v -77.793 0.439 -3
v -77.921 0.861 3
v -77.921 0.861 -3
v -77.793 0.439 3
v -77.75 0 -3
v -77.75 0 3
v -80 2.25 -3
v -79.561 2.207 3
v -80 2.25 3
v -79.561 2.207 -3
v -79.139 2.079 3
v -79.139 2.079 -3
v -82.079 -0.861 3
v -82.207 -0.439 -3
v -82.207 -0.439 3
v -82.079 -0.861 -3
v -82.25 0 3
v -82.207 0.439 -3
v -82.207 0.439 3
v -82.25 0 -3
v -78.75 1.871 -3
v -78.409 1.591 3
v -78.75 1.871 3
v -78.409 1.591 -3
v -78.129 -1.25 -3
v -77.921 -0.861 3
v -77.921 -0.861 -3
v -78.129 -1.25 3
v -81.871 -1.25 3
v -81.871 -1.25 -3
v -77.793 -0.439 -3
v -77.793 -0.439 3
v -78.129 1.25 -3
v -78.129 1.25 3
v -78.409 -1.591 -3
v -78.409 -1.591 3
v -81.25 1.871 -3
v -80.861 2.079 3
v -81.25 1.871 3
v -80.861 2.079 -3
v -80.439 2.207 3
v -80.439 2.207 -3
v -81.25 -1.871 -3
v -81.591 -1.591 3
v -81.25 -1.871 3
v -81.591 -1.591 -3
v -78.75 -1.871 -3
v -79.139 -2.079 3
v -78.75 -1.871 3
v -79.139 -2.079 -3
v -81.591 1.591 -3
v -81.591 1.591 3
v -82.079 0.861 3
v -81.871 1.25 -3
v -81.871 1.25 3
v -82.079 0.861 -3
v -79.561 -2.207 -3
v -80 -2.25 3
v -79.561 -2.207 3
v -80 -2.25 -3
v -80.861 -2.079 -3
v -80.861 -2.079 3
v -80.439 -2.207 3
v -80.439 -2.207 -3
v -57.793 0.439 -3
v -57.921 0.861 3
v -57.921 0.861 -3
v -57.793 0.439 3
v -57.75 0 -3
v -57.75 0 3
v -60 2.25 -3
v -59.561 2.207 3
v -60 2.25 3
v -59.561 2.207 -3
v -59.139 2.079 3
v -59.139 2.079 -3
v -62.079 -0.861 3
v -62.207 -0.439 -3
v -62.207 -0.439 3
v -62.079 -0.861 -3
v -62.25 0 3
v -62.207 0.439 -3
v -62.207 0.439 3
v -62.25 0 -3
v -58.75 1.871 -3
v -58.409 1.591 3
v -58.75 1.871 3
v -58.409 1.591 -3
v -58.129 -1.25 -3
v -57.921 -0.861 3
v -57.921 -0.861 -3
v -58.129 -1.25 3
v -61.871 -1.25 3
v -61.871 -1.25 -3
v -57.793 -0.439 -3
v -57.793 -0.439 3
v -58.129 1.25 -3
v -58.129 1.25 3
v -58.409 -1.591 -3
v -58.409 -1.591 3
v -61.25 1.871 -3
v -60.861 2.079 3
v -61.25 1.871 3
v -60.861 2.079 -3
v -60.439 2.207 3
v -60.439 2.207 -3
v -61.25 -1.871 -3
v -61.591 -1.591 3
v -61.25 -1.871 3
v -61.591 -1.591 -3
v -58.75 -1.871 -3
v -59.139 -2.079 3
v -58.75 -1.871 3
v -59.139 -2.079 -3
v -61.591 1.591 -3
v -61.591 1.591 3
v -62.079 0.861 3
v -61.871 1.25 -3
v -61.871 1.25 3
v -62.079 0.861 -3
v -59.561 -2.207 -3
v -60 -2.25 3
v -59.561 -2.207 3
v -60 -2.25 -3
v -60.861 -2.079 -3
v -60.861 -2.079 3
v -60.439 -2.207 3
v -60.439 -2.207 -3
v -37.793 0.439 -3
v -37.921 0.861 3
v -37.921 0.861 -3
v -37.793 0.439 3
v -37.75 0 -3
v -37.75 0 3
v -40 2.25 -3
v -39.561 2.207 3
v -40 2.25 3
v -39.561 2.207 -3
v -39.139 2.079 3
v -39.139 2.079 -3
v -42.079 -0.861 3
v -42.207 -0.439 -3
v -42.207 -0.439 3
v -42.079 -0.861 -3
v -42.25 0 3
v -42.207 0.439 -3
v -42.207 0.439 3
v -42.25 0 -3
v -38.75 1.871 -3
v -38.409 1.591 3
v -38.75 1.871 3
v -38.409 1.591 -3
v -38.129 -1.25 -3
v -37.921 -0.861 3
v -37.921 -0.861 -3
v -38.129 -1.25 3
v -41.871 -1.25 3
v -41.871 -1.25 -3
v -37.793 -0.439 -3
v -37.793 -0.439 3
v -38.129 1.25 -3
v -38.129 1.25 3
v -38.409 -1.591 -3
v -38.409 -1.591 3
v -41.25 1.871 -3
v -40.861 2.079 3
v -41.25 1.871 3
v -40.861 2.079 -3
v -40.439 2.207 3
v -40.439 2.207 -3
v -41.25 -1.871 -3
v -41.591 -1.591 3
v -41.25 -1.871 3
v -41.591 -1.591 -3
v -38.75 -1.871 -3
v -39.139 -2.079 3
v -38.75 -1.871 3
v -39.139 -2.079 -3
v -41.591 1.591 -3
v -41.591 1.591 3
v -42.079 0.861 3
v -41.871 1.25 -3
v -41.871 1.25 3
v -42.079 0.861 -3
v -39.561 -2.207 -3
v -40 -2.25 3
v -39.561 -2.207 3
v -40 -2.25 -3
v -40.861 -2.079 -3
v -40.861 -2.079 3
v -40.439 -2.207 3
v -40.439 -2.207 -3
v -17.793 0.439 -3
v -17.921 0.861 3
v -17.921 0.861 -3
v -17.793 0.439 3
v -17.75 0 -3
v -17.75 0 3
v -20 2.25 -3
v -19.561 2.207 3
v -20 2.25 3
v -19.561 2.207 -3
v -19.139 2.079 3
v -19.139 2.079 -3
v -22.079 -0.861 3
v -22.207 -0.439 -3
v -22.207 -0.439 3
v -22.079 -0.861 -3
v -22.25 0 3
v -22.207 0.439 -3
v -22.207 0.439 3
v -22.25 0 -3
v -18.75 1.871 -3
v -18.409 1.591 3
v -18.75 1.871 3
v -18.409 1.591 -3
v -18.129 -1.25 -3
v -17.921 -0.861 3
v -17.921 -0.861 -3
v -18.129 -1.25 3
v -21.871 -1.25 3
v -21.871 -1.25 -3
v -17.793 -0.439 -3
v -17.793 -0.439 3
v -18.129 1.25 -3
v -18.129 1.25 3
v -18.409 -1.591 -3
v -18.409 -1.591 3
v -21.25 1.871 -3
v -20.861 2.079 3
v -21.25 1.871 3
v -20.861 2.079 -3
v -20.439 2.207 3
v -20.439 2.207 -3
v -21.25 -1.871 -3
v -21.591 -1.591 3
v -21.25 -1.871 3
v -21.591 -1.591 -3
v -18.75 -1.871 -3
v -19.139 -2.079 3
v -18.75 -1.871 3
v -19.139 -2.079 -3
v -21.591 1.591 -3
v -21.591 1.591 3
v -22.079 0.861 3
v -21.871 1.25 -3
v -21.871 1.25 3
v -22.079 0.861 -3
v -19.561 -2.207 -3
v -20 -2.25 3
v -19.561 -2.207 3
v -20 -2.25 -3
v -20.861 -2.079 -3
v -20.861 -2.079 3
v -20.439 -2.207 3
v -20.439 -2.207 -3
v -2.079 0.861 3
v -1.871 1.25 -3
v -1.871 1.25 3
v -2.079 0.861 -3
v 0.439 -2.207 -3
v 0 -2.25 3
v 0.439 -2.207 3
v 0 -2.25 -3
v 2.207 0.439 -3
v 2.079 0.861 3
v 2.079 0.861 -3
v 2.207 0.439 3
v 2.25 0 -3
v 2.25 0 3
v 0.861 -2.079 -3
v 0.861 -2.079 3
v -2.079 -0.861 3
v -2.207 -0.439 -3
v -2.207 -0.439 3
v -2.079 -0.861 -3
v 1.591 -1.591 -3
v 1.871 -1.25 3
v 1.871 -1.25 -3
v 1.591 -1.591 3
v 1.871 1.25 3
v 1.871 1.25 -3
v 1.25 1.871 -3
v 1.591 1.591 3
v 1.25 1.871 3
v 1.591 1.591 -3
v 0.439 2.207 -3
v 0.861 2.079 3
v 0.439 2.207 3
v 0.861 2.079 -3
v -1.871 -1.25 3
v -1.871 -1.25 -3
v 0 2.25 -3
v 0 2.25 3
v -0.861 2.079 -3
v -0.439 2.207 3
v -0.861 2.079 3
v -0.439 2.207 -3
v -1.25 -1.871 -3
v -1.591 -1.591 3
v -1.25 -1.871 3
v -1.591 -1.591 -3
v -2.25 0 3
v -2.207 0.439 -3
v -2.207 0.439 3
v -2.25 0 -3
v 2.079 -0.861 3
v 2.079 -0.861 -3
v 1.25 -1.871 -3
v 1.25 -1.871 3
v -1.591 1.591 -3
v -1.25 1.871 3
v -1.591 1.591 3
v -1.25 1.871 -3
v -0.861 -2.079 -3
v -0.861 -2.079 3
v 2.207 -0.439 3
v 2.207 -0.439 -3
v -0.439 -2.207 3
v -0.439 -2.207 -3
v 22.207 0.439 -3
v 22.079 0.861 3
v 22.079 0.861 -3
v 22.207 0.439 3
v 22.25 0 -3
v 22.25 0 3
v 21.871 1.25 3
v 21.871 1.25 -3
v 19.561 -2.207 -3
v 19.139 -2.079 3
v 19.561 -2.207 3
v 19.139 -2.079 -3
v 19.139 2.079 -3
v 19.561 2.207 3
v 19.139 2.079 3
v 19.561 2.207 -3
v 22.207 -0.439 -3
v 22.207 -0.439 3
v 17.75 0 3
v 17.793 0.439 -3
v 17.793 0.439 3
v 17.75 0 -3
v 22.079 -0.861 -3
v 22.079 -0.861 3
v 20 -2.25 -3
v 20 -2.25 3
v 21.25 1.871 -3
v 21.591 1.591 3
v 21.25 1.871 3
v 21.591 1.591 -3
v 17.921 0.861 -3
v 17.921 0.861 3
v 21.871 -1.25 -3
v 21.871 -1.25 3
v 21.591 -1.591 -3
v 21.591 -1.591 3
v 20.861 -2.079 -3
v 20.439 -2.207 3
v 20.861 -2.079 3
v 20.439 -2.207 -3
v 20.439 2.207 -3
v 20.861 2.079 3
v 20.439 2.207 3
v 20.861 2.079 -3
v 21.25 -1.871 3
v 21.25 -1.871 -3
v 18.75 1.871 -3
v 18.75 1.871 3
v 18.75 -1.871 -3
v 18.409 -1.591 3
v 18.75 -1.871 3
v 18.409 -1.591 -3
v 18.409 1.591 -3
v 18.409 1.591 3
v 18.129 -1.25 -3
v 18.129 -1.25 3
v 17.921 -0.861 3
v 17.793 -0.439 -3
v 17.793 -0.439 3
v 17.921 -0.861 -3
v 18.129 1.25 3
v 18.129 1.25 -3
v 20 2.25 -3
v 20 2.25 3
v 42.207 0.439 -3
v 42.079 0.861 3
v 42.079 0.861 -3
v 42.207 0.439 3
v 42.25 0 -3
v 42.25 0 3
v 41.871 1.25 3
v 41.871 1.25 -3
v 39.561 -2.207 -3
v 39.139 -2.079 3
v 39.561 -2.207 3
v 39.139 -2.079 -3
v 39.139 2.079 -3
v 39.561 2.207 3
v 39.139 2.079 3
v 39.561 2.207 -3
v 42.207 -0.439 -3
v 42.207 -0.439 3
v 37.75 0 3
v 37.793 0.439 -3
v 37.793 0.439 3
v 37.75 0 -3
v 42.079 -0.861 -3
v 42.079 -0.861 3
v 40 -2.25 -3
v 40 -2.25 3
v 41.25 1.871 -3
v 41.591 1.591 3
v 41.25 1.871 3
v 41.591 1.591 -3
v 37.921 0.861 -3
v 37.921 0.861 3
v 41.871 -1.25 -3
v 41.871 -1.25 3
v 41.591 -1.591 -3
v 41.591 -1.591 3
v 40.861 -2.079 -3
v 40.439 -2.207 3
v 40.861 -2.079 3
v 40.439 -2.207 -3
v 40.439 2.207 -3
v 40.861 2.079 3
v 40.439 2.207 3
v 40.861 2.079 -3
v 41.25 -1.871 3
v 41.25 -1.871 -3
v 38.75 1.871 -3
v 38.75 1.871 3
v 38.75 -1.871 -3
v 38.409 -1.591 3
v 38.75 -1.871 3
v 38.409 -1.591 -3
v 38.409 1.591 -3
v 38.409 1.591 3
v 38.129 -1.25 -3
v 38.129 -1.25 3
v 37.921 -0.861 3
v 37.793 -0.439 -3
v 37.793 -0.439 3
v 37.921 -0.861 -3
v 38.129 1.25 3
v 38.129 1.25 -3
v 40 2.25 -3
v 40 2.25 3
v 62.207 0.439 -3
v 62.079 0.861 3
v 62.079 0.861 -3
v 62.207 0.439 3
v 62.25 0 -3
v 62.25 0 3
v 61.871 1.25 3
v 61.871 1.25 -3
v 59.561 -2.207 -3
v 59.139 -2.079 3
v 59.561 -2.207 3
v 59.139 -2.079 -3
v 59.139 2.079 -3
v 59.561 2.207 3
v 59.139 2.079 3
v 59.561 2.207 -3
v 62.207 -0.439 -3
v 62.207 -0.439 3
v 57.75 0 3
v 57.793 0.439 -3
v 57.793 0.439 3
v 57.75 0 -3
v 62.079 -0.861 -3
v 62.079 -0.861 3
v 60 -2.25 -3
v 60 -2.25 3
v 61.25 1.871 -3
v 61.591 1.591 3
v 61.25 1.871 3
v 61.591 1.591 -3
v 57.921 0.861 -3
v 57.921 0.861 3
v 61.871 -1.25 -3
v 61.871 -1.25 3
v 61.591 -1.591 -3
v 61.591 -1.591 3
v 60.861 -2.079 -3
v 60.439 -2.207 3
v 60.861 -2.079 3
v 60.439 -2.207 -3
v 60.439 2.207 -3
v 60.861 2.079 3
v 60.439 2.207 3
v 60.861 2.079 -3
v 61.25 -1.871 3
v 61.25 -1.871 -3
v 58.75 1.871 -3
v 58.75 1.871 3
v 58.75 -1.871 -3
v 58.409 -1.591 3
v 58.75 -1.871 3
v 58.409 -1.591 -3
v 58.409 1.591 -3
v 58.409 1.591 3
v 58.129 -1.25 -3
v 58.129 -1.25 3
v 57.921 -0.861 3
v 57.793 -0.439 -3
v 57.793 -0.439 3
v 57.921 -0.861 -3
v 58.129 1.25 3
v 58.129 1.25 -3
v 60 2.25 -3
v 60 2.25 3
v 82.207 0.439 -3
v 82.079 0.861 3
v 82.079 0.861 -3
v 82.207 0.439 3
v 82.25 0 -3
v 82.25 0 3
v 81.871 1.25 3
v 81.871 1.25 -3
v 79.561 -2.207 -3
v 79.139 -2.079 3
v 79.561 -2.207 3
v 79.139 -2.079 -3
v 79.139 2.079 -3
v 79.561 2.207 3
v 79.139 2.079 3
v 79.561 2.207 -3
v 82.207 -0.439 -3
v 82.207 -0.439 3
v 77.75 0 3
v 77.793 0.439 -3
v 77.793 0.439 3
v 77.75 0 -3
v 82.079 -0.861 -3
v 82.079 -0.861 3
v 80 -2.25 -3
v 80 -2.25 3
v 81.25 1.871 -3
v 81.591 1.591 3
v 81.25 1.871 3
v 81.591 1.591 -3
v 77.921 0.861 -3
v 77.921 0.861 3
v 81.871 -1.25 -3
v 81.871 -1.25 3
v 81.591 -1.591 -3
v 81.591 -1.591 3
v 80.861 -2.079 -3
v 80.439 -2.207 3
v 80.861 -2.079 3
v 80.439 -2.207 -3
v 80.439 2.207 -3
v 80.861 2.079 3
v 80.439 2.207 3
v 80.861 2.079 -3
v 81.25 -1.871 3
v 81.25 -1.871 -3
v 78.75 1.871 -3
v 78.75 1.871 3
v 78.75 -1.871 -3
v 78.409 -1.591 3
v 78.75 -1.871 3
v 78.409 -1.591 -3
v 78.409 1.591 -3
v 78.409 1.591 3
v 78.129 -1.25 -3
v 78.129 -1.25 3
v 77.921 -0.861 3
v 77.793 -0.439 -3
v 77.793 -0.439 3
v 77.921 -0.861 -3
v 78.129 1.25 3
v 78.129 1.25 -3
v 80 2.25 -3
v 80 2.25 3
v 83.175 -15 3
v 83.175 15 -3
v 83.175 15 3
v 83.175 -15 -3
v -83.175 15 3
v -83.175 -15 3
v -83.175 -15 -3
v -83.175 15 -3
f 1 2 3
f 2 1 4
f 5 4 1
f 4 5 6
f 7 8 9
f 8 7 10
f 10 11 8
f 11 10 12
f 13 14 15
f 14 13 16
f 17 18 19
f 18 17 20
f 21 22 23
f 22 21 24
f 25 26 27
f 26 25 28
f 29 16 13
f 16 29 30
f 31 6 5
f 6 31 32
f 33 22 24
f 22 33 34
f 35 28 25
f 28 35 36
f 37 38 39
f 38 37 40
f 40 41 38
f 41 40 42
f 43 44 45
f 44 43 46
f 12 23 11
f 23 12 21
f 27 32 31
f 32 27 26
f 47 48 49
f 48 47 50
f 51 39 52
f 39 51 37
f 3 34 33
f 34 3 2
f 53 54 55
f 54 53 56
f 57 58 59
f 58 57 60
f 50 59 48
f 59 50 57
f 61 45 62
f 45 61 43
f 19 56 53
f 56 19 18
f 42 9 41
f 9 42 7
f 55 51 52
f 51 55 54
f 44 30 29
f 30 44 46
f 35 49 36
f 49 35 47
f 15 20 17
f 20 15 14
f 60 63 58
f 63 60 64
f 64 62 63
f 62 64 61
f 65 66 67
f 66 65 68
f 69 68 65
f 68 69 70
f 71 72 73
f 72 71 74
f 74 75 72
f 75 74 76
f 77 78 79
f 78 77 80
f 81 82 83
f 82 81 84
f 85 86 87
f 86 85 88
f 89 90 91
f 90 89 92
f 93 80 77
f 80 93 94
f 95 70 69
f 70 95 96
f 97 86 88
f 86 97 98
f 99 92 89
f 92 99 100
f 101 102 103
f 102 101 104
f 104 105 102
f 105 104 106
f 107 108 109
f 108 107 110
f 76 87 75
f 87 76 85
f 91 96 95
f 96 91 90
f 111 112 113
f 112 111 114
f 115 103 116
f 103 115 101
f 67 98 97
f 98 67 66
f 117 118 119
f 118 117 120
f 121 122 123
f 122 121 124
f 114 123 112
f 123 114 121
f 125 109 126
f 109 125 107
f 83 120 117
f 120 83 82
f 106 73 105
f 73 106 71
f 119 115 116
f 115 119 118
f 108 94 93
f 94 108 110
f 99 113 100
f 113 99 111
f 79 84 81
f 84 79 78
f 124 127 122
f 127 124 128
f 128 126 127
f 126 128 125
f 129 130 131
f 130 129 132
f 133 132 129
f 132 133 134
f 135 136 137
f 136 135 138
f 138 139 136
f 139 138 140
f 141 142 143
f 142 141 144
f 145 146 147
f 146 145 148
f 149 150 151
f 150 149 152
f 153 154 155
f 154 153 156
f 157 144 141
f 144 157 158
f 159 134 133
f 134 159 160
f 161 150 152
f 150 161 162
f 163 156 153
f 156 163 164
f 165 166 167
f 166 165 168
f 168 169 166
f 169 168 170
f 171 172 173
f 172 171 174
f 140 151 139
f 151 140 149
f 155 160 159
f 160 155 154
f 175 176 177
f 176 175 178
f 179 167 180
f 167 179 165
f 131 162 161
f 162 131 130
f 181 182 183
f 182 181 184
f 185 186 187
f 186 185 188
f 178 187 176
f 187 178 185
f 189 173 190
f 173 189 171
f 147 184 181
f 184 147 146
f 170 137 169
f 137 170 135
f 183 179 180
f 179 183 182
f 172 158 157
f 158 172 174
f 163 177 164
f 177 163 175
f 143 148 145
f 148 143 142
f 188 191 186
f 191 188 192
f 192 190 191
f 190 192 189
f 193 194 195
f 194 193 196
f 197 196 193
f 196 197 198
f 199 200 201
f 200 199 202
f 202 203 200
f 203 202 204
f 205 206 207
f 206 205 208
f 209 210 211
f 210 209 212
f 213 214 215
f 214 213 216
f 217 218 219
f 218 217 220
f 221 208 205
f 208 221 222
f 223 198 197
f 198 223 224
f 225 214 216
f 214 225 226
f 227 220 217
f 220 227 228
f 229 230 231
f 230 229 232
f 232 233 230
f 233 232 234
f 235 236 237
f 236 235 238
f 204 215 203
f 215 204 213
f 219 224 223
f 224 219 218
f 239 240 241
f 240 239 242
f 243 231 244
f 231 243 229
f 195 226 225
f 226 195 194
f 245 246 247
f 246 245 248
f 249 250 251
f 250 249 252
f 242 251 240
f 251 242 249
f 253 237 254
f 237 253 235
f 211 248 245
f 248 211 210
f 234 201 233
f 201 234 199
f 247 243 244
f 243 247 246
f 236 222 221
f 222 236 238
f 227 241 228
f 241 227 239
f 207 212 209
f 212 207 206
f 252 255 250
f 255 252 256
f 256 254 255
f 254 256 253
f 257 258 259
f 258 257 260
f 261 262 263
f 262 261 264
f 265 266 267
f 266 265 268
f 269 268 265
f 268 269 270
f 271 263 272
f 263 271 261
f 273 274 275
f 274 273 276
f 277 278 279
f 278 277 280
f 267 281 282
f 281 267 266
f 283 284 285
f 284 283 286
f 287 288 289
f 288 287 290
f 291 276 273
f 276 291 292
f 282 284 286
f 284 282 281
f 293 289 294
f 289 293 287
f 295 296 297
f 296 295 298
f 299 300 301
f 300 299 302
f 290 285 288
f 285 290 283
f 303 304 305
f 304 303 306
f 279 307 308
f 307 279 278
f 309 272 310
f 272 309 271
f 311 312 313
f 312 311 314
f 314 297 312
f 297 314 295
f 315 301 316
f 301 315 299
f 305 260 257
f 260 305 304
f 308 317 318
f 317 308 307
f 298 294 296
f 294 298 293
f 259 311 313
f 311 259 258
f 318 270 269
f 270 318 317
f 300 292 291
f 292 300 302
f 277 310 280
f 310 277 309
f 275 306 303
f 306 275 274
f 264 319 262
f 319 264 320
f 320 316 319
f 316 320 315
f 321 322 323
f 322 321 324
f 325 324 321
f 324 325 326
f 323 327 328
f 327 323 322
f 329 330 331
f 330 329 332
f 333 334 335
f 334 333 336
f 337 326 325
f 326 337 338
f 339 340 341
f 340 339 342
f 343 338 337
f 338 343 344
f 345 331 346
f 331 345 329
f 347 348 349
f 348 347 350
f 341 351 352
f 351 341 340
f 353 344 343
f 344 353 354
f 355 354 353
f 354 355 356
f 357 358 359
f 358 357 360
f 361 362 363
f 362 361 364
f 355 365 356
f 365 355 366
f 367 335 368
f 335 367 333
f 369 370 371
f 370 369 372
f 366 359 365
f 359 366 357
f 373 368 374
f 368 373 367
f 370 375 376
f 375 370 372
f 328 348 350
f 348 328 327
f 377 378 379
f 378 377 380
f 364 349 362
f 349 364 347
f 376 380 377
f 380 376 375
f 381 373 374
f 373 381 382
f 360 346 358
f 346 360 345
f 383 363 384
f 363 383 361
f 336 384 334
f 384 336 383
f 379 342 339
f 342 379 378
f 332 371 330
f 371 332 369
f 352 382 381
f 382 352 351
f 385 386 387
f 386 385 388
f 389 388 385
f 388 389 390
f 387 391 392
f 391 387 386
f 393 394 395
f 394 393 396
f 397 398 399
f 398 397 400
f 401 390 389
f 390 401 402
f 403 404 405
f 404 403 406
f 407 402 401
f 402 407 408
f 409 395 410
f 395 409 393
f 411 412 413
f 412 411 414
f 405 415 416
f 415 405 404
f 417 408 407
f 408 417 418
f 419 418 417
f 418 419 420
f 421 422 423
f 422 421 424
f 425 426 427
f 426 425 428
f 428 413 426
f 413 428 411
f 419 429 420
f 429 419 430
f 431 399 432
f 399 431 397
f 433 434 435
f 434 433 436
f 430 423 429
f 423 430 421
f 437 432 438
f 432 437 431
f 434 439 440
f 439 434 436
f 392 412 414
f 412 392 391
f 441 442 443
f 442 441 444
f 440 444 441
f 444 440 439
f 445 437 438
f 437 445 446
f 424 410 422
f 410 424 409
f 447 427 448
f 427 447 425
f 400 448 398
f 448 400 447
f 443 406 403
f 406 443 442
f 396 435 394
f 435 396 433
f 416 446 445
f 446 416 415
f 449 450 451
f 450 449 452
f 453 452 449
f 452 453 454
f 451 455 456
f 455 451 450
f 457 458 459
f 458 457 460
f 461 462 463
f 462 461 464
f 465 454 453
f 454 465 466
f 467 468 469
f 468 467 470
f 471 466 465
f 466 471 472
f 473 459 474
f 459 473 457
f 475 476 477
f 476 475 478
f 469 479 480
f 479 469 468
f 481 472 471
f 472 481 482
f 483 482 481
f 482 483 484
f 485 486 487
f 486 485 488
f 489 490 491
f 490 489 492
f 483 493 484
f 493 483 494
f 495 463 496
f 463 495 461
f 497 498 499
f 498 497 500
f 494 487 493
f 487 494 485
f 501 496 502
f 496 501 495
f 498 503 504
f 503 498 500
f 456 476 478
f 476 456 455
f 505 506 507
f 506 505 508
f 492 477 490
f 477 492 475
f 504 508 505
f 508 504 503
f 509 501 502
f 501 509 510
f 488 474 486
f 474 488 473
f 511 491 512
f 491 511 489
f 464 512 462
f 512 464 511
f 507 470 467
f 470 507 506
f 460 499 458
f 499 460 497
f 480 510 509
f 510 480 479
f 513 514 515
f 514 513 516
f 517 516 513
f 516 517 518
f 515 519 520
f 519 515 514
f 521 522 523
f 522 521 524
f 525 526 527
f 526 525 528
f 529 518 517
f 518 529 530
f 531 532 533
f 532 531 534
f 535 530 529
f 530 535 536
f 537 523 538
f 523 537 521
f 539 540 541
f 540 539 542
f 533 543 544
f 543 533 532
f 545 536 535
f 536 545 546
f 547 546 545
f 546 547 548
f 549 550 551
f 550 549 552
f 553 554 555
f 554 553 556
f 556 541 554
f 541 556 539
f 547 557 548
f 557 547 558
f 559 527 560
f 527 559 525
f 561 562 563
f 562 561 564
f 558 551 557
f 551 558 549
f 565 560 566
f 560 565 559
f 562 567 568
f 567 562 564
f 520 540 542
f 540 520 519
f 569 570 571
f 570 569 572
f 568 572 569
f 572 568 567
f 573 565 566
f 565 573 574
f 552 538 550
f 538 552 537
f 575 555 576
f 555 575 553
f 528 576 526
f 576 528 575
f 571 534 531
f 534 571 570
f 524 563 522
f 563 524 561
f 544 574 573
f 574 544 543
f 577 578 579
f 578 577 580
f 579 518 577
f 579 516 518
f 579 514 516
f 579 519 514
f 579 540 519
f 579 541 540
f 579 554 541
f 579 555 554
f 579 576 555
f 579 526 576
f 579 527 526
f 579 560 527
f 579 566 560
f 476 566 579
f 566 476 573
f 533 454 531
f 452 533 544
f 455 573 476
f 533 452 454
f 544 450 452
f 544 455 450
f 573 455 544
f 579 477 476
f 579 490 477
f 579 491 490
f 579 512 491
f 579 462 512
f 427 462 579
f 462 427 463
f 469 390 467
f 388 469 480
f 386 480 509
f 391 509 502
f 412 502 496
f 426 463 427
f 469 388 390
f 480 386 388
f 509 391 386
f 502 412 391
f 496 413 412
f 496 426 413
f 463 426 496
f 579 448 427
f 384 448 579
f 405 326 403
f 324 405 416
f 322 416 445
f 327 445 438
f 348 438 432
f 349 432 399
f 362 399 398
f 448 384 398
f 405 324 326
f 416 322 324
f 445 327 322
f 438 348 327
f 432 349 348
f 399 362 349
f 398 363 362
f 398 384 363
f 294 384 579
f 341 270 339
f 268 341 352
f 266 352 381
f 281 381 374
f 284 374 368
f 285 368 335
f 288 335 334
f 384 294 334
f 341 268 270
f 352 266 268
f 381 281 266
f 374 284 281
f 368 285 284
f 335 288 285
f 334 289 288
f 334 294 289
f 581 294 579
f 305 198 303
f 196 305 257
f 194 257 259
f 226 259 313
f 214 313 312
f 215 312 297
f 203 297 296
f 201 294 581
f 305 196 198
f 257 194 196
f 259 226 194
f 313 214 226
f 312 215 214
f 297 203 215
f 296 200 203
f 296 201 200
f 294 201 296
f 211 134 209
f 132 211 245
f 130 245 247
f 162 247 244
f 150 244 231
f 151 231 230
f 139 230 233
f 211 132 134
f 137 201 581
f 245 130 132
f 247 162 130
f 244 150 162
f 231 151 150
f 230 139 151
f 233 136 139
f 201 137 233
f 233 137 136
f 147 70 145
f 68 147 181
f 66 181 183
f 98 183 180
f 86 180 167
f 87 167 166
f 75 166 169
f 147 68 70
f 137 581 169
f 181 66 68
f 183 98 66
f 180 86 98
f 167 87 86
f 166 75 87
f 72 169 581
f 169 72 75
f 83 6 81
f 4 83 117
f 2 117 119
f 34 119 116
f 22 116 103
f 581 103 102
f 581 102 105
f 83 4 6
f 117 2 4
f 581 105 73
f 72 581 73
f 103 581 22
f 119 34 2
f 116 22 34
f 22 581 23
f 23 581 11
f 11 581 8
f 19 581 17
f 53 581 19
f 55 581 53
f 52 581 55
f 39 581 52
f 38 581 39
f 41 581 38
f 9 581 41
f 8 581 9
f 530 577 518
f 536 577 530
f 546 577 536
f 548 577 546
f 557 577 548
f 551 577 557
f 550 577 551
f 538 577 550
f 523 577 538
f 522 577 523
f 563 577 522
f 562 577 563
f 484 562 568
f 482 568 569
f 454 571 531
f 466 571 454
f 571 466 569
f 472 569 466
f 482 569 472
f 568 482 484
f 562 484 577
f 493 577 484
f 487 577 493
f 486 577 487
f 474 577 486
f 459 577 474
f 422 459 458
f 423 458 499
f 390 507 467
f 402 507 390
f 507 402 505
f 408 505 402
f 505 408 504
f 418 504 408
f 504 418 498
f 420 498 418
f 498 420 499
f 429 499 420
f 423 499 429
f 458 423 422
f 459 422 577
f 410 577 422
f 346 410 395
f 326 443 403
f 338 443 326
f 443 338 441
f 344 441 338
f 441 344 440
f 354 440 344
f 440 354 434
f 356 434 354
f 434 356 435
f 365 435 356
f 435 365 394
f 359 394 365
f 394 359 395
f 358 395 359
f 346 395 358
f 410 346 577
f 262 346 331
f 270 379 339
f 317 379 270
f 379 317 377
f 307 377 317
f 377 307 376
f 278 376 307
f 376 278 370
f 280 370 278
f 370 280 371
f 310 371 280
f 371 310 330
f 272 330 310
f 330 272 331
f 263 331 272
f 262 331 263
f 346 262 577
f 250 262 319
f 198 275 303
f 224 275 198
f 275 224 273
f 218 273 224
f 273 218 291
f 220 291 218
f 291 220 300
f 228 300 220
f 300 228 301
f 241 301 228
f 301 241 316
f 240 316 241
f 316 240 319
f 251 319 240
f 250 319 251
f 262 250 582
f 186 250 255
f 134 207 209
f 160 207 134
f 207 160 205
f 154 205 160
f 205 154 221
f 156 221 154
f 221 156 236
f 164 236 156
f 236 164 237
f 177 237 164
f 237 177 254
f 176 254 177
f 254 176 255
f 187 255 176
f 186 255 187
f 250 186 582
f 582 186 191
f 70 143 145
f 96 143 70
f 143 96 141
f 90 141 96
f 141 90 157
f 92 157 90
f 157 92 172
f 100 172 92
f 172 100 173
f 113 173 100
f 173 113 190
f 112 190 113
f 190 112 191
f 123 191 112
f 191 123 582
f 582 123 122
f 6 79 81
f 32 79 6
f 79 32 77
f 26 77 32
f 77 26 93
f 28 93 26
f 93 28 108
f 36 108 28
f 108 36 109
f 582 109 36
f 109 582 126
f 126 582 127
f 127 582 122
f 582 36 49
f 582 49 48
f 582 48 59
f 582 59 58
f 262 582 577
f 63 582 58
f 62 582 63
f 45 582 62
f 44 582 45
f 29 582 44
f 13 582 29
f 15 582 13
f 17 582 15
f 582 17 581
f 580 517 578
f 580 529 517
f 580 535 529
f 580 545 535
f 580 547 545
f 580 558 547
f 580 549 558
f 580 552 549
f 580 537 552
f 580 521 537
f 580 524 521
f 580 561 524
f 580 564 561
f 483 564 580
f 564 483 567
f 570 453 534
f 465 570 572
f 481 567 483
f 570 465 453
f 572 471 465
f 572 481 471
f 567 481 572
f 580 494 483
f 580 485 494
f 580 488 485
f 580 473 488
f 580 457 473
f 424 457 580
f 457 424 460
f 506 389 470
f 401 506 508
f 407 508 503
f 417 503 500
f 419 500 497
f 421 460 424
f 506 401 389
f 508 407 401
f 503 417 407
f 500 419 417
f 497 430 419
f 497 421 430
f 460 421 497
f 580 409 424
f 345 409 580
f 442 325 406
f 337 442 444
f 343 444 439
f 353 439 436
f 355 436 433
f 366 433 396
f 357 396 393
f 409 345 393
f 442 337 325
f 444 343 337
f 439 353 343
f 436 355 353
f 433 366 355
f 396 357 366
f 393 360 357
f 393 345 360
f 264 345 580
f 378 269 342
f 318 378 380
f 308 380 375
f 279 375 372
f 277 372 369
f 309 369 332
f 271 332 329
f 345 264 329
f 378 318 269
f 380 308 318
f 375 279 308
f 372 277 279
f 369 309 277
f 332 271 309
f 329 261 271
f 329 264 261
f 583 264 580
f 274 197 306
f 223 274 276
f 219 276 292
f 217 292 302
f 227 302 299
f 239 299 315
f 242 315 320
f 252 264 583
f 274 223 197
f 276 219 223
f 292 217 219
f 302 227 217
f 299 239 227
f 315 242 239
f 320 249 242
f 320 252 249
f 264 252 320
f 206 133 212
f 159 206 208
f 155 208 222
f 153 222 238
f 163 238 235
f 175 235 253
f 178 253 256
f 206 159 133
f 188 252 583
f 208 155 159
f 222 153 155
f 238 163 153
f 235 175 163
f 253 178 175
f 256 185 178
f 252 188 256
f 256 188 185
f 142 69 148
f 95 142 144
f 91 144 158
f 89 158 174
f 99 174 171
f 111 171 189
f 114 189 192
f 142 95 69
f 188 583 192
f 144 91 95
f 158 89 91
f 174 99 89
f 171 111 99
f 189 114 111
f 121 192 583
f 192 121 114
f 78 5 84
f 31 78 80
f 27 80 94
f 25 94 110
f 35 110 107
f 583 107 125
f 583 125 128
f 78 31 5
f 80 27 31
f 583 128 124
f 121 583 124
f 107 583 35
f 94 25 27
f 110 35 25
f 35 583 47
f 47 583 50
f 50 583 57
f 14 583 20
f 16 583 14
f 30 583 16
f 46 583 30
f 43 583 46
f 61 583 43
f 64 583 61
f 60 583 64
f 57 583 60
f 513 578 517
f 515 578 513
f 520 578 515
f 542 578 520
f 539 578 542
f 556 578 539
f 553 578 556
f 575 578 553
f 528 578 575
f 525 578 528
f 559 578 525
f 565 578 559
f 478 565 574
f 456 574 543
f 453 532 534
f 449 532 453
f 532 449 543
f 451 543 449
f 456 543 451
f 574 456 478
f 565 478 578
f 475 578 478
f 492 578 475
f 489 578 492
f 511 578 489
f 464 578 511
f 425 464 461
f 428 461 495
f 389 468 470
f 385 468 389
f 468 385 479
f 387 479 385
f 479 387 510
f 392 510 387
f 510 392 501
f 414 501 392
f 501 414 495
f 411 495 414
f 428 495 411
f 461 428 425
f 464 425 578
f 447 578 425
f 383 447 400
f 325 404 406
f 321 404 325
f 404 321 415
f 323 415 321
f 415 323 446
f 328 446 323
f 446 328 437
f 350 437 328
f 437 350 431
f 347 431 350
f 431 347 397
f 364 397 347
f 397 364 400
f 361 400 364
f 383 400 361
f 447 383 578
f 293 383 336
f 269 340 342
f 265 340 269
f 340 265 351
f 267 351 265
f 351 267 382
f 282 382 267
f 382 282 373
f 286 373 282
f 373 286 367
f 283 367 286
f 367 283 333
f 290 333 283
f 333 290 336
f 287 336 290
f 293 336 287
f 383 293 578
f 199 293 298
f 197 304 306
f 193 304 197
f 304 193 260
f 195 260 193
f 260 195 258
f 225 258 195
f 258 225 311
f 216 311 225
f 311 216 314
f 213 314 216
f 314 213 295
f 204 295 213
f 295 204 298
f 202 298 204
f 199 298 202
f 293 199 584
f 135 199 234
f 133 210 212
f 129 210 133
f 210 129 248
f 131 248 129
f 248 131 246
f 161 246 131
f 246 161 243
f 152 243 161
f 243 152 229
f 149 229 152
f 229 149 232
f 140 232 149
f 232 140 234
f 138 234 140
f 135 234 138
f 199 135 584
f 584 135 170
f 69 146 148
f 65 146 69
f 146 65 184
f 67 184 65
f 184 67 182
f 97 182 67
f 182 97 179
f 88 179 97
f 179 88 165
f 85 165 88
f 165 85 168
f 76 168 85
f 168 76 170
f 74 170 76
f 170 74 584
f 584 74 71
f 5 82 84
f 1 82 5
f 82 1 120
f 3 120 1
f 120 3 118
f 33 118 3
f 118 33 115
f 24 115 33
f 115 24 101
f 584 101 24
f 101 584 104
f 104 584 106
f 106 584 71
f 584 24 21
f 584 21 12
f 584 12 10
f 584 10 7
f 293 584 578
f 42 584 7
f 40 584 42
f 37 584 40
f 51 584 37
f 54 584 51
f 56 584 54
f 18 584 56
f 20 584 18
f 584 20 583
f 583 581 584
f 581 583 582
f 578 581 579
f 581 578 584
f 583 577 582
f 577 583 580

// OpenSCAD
$fn = 32;

// ----------------------------------------------------------------------
// Hole bar, 9 x Ø4.5
// row layout, 3.175 mm edge offset
// ----------------------------------------------------------------------

// --- parameters (mm) ---
bar_w = 30;    // bar width (Y)
bar_t = 6;     // bar thickness (Z)
holes = 9;     // holes per row
hole_d = 4.5;  // hole diameter
edge = 3.175;  // offset from the bar end to the first hole
pitch = 20;    // pitch between neighbouring holes

// --- derived feature positions (mm) ---
span = (holes - 1) * pitch;   // = 160   distance between the end holes
bar_l = span + 2 * edge;      // = 166.35   overall bar length
start_x = -bar_l / 2 + edge;  // = -80   X of the first hole
feature_centers = [
  [start_x + 0 * pitch, 0],
  [start_x + 1 * pitch, 0],
  [start_x + 2 * pitch, 0],
  [start_x + 3 * pitch, 0],
  [start_x + 4 * pitch, 0],
  [start_x + 5 * pitch, 0],
  [start_x + 6 * pitch, 0],
  [start_x + 7 * pitch, 0],
  [start_x + 8 * pitch, 0]
];   // hole centres of the first row

// bar with one row of holes, drilled from feature_centers
difference() {
  translate([-bar_l / 2, -bar_w / 2, -bar_t / 2]) cube([bar_l, bar_w, bar_t]);
  for (centre = feature_centers)
    translate([centre[0], centre[1], 0])
      cylinder(d = hole_d, h = bar_t + 2, center = true);
}
